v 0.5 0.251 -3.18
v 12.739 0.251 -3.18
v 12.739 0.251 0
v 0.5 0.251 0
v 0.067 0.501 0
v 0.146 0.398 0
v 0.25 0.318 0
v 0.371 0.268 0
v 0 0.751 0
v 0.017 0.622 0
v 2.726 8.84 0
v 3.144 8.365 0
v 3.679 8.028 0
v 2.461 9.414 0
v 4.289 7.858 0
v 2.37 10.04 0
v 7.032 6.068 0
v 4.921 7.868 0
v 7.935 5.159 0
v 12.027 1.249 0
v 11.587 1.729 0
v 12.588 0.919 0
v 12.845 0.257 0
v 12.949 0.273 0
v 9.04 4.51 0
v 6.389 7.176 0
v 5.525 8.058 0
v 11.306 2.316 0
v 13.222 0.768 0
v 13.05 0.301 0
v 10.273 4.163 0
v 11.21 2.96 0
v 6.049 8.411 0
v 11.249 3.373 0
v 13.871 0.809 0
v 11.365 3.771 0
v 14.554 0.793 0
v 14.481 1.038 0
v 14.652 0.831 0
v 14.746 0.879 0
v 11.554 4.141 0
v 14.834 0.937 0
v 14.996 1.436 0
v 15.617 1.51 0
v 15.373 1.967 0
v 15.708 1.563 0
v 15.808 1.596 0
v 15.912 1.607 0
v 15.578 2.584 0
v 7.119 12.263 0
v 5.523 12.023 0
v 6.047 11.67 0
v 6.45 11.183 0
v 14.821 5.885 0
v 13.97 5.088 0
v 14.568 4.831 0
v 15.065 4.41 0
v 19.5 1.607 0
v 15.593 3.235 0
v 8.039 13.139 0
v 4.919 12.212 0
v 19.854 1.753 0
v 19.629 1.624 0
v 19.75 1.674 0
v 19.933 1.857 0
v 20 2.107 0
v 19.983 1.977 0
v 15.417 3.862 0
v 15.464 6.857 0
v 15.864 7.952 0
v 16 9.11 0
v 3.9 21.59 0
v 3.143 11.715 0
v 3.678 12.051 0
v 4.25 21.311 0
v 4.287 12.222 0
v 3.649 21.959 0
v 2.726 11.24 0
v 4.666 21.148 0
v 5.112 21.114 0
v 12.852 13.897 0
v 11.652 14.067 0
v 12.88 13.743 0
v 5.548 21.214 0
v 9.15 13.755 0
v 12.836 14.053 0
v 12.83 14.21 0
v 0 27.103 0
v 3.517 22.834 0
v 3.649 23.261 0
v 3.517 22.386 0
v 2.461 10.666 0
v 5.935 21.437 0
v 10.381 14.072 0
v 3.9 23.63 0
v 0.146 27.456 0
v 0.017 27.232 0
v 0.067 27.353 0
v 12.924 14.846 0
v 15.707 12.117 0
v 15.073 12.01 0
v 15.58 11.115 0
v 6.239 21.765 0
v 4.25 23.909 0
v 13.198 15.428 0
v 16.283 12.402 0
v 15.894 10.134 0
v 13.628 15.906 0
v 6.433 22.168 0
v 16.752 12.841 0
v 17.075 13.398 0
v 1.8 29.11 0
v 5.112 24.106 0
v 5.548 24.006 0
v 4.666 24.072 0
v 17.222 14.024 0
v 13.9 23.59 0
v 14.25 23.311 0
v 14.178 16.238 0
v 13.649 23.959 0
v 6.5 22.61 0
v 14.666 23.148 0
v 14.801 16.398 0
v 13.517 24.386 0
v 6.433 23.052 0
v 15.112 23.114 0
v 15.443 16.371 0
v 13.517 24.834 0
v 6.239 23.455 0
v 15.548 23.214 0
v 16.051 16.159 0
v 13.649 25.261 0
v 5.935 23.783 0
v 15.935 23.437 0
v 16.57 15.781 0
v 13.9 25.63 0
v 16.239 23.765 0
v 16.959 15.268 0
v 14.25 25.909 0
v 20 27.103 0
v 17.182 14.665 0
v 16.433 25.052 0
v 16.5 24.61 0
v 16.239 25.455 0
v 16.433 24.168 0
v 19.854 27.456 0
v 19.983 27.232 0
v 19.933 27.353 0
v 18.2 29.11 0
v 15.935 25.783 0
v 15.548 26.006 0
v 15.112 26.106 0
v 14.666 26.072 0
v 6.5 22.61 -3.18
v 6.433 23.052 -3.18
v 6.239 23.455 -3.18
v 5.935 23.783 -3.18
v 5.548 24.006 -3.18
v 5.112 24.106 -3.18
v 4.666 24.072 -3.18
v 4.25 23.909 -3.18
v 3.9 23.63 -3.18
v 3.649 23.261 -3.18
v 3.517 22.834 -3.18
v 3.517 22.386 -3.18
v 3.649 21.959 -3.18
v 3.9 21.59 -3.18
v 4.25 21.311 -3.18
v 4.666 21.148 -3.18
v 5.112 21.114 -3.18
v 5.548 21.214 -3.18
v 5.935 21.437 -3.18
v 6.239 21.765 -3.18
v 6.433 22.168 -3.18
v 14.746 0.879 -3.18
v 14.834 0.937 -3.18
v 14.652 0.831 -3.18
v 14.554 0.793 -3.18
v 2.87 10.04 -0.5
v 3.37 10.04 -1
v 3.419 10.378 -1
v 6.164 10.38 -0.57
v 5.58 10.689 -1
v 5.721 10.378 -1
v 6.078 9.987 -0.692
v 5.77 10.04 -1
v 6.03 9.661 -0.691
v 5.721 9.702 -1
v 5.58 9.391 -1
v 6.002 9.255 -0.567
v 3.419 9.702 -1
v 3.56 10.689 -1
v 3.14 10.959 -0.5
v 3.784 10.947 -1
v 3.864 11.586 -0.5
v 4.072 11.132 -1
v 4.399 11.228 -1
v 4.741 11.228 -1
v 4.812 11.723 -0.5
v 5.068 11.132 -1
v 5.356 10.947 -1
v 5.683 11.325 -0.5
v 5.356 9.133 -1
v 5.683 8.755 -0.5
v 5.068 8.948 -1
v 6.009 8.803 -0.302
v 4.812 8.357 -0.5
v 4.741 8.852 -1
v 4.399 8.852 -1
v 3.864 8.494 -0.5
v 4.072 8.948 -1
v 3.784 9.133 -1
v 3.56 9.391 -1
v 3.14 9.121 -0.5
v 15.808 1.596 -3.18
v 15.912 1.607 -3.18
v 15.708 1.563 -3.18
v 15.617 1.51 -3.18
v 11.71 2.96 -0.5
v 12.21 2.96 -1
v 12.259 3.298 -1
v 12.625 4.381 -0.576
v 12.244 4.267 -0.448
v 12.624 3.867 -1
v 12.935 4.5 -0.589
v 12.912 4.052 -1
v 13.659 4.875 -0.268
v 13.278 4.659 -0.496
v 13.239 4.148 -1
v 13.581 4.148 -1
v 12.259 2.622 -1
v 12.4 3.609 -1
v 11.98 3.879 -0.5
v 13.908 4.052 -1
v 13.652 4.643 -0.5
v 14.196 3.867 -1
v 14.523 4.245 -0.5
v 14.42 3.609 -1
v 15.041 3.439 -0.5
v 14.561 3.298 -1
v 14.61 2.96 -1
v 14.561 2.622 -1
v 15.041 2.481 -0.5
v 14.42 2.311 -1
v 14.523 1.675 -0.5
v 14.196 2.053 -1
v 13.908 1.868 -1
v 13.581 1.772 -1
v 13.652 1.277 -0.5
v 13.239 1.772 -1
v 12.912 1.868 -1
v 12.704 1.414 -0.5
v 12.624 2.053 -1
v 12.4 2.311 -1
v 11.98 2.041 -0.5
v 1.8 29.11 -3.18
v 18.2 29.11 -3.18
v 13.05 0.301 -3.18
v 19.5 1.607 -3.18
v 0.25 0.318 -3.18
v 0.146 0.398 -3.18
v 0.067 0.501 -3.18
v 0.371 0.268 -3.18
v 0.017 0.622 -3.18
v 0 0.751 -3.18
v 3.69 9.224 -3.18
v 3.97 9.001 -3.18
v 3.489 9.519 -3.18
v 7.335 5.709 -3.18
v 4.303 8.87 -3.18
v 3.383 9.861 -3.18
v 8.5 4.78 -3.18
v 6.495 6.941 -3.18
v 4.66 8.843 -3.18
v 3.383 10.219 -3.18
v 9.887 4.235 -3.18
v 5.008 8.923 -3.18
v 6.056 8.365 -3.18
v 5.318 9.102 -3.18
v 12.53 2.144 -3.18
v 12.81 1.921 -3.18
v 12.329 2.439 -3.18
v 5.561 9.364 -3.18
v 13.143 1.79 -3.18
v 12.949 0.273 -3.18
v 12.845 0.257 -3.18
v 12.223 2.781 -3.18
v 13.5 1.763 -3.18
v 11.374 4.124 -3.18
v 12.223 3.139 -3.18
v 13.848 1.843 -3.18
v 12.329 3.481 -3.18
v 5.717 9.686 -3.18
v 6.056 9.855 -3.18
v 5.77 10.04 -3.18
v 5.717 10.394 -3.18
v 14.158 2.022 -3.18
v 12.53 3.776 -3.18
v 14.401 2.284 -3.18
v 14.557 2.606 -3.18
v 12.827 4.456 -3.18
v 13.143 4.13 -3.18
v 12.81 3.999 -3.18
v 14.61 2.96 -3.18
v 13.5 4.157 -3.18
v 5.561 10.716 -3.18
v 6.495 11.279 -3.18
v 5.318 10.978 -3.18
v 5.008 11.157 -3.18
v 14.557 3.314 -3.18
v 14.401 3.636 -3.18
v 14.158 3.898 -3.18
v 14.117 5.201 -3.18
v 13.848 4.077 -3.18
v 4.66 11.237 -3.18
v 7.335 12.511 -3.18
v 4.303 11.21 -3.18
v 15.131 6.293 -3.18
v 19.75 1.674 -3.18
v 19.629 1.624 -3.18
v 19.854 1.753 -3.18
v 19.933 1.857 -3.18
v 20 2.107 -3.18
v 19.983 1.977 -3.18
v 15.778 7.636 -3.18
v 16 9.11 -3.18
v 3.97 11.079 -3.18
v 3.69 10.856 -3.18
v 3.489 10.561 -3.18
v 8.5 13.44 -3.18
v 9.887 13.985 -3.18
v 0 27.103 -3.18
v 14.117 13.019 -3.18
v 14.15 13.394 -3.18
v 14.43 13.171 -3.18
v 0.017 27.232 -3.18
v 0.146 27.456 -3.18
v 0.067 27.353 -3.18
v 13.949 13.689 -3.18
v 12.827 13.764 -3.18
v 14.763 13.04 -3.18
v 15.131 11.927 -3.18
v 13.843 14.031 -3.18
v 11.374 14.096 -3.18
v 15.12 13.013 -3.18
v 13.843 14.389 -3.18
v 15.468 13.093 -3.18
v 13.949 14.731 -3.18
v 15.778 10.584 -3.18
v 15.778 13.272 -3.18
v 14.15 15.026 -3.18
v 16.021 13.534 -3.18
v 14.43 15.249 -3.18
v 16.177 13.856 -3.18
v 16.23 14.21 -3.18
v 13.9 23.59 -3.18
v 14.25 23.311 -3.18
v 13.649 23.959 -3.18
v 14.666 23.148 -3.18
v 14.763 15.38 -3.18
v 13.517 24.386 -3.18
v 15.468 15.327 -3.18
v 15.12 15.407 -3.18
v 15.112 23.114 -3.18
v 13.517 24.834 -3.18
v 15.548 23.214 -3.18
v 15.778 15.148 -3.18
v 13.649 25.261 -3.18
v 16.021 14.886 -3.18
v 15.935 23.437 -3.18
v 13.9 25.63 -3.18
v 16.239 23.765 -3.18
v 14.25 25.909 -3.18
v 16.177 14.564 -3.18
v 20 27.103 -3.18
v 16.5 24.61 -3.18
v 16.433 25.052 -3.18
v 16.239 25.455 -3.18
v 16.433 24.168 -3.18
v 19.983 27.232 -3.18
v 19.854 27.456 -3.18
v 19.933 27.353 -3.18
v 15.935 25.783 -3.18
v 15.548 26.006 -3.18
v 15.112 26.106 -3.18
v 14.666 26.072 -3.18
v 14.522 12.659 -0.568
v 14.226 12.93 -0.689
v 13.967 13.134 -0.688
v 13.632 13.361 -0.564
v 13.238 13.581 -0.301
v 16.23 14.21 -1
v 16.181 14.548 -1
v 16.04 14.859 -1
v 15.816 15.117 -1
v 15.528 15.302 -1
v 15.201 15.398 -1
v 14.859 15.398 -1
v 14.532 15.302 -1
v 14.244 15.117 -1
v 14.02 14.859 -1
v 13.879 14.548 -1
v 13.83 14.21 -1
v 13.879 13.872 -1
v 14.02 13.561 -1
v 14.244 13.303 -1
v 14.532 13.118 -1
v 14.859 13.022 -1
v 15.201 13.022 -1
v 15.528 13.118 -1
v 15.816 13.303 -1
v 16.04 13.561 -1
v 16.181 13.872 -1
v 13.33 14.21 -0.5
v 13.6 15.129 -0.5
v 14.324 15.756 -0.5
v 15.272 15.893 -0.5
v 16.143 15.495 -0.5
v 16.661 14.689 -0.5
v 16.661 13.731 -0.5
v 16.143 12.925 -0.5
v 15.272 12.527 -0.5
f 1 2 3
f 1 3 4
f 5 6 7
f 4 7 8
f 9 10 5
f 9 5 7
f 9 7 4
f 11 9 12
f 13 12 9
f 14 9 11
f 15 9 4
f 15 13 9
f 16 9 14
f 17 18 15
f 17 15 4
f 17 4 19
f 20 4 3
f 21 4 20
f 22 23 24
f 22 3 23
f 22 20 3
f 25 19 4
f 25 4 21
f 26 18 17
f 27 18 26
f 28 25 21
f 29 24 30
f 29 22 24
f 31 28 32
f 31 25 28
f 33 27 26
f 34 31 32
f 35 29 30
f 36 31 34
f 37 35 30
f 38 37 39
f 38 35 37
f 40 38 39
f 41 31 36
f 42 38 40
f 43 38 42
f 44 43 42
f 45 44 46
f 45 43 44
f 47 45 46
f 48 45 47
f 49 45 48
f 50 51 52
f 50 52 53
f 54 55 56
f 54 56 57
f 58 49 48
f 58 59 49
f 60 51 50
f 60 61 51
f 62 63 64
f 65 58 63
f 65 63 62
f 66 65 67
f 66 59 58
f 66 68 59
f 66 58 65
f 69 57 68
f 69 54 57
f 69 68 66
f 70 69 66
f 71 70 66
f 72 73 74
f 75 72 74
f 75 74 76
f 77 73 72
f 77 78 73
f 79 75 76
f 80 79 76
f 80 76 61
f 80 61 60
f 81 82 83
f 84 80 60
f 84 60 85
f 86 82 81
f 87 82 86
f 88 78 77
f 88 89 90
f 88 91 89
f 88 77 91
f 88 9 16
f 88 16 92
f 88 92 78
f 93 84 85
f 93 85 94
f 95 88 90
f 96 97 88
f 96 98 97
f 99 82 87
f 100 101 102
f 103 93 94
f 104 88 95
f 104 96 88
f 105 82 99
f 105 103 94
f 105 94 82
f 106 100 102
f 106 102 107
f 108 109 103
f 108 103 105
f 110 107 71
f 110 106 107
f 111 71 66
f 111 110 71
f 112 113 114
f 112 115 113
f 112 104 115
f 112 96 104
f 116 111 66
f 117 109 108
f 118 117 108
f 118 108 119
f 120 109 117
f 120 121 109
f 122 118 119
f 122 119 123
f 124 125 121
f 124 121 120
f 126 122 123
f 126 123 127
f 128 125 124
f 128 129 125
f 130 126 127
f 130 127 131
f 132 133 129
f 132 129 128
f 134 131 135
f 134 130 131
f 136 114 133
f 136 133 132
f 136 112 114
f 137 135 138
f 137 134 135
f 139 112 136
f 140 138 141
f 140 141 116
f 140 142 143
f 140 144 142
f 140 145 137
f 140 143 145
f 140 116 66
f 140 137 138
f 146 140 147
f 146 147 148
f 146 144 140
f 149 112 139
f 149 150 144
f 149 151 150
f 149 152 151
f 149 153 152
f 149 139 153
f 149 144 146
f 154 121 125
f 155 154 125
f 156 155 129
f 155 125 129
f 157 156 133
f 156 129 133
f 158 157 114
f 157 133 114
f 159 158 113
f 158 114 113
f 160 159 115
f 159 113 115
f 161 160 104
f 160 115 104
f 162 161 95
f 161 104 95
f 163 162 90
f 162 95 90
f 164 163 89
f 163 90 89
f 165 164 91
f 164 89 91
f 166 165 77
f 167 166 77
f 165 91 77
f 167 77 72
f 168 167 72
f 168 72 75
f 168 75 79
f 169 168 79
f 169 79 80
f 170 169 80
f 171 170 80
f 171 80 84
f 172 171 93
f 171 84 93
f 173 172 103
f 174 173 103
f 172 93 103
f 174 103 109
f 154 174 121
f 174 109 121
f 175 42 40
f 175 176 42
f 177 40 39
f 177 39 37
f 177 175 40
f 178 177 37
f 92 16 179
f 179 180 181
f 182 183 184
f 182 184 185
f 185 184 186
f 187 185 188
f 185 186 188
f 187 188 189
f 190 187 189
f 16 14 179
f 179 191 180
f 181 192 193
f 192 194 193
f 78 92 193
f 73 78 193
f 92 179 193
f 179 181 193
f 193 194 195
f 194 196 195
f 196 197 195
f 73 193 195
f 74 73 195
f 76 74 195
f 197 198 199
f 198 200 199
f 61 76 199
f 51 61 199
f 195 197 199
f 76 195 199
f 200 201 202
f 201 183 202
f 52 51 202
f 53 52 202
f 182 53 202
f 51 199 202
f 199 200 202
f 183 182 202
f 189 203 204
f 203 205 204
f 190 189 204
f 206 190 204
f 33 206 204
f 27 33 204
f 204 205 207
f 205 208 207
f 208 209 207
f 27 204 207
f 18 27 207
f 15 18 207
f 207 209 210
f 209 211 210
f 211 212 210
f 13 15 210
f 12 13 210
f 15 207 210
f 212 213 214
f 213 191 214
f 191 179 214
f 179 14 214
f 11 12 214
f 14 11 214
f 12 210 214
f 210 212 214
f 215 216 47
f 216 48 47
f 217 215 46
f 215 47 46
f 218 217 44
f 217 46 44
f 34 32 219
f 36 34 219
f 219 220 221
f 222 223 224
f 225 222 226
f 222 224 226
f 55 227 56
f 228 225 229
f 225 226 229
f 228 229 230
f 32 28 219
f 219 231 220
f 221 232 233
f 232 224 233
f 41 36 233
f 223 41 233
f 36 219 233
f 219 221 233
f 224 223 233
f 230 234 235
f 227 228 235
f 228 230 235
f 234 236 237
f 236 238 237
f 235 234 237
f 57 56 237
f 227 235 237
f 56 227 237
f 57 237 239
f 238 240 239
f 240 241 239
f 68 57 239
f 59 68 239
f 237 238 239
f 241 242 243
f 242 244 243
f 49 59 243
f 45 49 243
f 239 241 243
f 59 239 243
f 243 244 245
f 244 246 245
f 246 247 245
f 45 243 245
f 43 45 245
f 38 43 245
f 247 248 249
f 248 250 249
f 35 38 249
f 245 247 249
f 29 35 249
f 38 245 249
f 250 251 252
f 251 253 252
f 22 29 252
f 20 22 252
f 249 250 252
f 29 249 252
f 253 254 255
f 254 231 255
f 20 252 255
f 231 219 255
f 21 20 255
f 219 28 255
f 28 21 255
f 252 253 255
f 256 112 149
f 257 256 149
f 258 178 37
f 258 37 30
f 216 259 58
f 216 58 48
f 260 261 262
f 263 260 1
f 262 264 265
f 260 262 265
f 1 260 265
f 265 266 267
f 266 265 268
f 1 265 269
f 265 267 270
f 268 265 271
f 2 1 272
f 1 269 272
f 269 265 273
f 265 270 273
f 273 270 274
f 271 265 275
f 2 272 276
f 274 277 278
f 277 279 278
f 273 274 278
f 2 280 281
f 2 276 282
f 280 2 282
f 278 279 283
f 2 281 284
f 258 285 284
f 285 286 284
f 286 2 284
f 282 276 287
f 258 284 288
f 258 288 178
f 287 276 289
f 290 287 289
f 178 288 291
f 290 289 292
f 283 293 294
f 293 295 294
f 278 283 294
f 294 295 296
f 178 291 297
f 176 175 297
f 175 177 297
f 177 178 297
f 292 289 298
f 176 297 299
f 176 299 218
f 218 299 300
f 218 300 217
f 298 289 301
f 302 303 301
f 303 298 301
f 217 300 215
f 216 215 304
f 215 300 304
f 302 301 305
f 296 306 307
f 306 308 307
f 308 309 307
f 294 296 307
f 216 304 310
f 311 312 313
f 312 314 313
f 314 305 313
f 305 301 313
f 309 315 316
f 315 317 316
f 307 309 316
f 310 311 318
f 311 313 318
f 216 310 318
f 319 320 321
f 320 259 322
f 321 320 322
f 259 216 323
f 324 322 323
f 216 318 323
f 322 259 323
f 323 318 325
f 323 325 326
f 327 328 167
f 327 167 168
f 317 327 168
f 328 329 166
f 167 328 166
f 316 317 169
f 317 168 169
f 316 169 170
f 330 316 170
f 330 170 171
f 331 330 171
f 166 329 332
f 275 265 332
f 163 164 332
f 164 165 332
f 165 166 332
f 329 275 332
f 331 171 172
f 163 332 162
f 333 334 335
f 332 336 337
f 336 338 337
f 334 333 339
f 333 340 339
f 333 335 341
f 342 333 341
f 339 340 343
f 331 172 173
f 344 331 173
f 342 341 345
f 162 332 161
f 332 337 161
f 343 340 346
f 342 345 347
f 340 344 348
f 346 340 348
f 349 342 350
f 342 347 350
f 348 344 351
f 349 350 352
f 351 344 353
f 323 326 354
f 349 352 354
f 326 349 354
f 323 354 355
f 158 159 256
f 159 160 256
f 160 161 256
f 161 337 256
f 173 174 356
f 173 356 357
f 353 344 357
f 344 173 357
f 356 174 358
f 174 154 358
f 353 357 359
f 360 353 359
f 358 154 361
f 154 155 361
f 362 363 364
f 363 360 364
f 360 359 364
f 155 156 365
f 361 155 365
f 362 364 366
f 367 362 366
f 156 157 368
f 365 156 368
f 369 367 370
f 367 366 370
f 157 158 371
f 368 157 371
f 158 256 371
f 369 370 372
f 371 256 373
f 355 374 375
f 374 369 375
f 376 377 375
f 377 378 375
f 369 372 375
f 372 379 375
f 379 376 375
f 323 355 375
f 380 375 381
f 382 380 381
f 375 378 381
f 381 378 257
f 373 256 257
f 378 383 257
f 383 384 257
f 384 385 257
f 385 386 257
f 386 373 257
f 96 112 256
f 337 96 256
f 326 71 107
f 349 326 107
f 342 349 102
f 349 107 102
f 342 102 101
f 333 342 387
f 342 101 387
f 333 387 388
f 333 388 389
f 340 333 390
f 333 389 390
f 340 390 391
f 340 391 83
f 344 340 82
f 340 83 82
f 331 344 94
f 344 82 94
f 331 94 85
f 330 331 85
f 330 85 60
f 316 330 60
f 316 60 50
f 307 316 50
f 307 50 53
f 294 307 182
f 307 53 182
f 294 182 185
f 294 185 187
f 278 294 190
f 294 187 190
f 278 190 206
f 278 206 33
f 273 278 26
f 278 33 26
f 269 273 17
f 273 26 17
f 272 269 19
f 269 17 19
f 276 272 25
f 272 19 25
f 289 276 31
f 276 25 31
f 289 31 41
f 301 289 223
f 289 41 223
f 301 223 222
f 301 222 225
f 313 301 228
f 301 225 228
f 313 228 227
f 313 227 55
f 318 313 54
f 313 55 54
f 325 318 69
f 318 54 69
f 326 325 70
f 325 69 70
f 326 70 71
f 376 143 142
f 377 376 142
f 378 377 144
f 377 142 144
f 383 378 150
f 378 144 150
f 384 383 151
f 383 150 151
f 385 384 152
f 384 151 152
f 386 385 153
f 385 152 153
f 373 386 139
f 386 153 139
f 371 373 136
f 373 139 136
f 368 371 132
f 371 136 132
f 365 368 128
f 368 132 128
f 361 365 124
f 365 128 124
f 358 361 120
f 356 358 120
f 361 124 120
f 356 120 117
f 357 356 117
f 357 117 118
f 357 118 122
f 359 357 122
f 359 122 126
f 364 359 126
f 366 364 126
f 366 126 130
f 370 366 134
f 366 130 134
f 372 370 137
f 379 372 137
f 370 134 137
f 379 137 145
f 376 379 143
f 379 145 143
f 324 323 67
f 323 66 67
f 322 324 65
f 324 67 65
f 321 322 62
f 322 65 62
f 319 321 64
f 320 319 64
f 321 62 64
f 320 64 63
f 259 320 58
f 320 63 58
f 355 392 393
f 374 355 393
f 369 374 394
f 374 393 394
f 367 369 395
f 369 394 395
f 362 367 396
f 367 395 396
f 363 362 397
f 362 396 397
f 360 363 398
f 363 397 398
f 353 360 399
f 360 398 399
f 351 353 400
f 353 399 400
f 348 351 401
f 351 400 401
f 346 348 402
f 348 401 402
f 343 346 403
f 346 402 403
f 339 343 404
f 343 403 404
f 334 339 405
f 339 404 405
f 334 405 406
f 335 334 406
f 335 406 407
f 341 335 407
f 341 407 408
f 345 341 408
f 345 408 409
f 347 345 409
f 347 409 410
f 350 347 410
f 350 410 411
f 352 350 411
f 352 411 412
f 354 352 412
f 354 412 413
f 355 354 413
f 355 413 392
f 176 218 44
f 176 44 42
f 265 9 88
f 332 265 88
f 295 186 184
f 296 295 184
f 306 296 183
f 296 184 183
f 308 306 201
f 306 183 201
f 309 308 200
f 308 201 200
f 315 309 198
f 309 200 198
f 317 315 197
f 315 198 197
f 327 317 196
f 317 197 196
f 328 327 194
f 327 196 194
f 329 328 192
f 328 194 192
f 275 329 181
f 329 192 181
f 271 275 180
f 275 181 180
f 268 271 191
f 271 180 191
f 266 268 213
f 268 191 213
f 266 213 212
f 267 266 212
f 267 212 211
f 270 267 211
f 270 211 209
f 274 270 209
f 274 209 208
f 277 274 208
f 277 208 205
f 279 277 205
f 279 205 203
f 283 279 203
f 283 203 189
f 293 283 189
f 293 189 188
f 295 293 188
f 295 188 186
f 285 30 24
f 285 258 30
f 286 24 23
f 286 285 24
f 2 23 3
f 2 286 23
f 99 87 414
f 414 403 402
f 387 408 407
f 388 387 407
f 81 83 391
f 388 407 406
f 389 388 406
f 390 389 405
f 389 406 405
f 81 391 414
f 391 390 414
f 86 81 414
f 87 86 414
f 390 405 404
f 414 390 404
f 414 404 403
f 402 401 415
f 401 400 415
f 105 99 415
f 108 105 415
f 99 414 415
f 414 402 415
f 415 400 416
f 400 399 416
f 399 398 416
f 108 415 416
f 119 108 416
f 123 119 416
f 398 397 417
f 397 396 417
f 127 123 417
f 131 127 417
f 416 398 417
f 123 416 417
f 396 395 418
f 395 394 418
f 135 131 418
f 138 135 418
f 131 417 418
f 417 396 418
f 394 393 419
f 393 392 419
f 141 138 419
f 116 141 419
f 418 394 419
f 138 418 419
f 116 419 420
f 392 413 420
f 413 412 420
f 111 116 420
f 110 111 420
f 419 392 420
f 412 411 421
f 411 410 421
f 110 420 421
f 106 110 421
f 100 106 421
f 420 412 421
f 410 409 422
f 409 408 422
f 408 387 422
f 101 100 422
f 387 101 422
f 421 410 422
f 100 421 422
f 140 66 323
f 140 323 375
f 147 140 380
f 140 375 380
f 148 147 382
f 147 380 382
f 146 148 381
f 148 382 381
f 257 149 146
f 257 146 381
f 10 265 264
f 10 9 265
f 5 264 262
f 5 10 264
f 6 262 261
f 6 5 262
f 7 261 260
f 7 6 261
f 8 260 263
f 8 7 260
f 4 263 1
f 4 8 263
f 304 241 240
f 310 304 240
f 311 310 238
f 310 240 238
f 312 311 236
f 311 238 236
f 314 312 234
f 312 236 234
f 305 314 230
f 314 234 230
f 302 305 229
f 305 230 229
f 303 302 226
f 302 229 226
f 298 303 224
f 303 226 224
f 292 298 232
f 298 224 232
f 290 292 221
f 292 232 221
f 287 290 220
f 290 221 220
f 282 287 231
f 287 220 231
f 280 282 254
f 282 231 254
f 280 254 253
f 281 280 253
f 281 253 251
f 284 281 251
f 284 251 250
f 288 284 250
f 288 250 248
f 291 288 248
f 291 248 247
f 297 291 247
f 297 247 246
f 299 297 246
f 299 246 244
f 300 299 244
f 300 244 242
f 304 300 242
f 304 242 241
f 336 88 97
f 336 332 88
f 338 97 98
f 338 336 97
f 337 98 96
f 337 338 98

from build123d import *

# Parameters (mm, degrees)
SKETCH1_W                                       = 20
SKETCH1_H                                       = 29.11
SKETCH1_R                                       = 1.5
SKETCH1_R_2                                     = 1.2
SKETCH1_R_3                                     = 5
BOSS_EXTRUDE2_DEPTH                             = 3.18
CSK_FOR_M2_FLAT_HEAD_MACHINE_SCREW1_D           = 2.4
CSK_FOR_M2_FLAT_HEAD_MACHINE_SCREW1_DEPTH       = 3.508967257
CSK_FOR_M2_FLAT_HEAD_MACHINE_SCREW1_CSINK_D     = 4.4
CSK_FOR_M2_FLAT_HEAD_MACHINE_SCREW1_CSINK_ANGLE = 90
CSK_FOR_M2_FLAT_HEAD_MACHINE_SCREW1_TIP         = 0.721032743
CHAMFER1_SIZE                                   = 1.8
FILLET1_R                                       = 0.5
CUT_EXTRUDE1_DEPTH                              = 4
FILLET6_R                                       = 0.5
CUT_EXTRUDE2_DEPTH                              = 4
FILLET8_R                                       = 1


with BuildPart() as part:
    # Sketch1 → Boss-Extrude2 (new body)
    with BuildSketch(Plane.XY):
        with Locations((10, 14.555)):
            Rectangle(SKETCH1_W, SKETCH1_H)
        with Locations((5, 22.61)):
            Circle(SKETCH1_R, mode=Mode.SUBTRACT)
        with Locations((15, 24.61)):
            Circle(SKETCH1_R, mode=Mode.SUBTRACT)
        with Locations((15.03, 14.21)):
            Circle(SKETCH1_R_2, mode=Mode.SUBTRACT)
        with Locations((4.57, 10.04)):
            Circle(SKETCH1_R_2, mode=Mode.SUBTRACT)
        with Locations((13.41, 2.96)):
            Circle(SKETCH1_R_2, mode=Mode.SUBTRACT)
        with Locations((11, 9.11)):
            Circle(SKETCH1_R_3, mode=Mode.SUBTRACT)
    extrude(amount=-BOSS_EXTRUDE2_DEPTH)

    # CSK for M2 Flat Head Machine Screw1
    with Locations(Plane.XY):
        with Locations((4.57, 10.04), (15.03, 14.21), (13.41, 2.96)):
            CounterSinkHole(CSK_FOR_M2_FLAT_HEAD_MACHINE_SCREW1_D / 2, CSK_FOR_M2_FLAT_HEAD_MACHINE_SCREW1_CSINK_D / 2, depth=CSK_FOR_M2_FLAT_HEAD_MACHINE_SCREW1_DEPTH, counter_sink_angle=CSK_FOR_M2_FLAT_HEAD_MACHINE_SCREW1_CSINK_ANGLE)
            with Locations((0, 0, -(CSK_FOR_M2_FLAT_HEAD_MACHINE_SCREW1_DEPTH + CSK_FOR_M2_FLAT_HEAD_MACHINE_SCREW1_TIP / 2))):  # 118° drill point
                Cone(0, CSK_FOR_M2_FLAT_HEAD_MACHINE_SCREW1_D / 2, CSK_FOR_M2_FLAT_HEAD_MACHINE_SCREW1_TIP, mode=Mode.SUBTRACT)

    # Chamfer1
    chamfer1_edges = [part.edges().sort_by_distance(p)[0] for p in [
        (0, 29.11, -1.59),
        (20, 29.11, -1.59),
    ]]
    chamfer(chamfer1_edges, length=CHAMFER1_SIZE)

    # Fillet1
    fillet1_edges = [part.edges().sort_by_distance(p)[0] for p in [
        (0, 27.31, -1.59),
        (20, 27.31, -1.59),
    ]]
    fillet(fillet1_edges, radius=FILLET1_R)

    # Sketch12 → Cut-Extrude1 (cut)
    with BuildSketch(Plane(origin=(0, 0, -3.18), x_dir=(-1, 0, 0), z_dir=(0, 0, -1))):
        Polygon((0, 0), (-20, 0), (-20, 1.60680291), (-15.748577863, 1.60680291), (-13.898929975, 0.251358625), (0, 0.251358625), align=None)
    extrude(amount=-CUT_EXTRUDE1_DEPTH, mode=Mode.SUBTRACT)

    # Fillet6
    fillet6_edges = [part.edges().sort_by_distance(p)[0] for p in [
        (0, 0.251358625, -1.59),
        (20, 1.60680291, -1.59),
        (15.748577863, 1.60680291, -1.59),
    ]]
    fillet(fillet6_edges, radius=FILLET6_R)

    # Sketch14 → Cut-Extrude2 (cut)
    with BuildSketch(Plane.XY):
        Polygon((12.898929975, 0.251358625), (13.898929975, 0.251358625), (14.705535433, 0.842448835), align=None)
    extrude(amount=-CUT_EXTRUDE2_DEPTH, mode=Mode.SUBTRACT)

    # Fillet8
    fillet8_edges = [part.edges().sort_by_distance(p)[0] for p in [
        (12.898929975, 0.251358625, -1.59),
        (14.705535433, 0.842448835, -1.59),
    ]]
    fillet(fillet8_edges, radius=FILLET8_R)


solid = part.part
